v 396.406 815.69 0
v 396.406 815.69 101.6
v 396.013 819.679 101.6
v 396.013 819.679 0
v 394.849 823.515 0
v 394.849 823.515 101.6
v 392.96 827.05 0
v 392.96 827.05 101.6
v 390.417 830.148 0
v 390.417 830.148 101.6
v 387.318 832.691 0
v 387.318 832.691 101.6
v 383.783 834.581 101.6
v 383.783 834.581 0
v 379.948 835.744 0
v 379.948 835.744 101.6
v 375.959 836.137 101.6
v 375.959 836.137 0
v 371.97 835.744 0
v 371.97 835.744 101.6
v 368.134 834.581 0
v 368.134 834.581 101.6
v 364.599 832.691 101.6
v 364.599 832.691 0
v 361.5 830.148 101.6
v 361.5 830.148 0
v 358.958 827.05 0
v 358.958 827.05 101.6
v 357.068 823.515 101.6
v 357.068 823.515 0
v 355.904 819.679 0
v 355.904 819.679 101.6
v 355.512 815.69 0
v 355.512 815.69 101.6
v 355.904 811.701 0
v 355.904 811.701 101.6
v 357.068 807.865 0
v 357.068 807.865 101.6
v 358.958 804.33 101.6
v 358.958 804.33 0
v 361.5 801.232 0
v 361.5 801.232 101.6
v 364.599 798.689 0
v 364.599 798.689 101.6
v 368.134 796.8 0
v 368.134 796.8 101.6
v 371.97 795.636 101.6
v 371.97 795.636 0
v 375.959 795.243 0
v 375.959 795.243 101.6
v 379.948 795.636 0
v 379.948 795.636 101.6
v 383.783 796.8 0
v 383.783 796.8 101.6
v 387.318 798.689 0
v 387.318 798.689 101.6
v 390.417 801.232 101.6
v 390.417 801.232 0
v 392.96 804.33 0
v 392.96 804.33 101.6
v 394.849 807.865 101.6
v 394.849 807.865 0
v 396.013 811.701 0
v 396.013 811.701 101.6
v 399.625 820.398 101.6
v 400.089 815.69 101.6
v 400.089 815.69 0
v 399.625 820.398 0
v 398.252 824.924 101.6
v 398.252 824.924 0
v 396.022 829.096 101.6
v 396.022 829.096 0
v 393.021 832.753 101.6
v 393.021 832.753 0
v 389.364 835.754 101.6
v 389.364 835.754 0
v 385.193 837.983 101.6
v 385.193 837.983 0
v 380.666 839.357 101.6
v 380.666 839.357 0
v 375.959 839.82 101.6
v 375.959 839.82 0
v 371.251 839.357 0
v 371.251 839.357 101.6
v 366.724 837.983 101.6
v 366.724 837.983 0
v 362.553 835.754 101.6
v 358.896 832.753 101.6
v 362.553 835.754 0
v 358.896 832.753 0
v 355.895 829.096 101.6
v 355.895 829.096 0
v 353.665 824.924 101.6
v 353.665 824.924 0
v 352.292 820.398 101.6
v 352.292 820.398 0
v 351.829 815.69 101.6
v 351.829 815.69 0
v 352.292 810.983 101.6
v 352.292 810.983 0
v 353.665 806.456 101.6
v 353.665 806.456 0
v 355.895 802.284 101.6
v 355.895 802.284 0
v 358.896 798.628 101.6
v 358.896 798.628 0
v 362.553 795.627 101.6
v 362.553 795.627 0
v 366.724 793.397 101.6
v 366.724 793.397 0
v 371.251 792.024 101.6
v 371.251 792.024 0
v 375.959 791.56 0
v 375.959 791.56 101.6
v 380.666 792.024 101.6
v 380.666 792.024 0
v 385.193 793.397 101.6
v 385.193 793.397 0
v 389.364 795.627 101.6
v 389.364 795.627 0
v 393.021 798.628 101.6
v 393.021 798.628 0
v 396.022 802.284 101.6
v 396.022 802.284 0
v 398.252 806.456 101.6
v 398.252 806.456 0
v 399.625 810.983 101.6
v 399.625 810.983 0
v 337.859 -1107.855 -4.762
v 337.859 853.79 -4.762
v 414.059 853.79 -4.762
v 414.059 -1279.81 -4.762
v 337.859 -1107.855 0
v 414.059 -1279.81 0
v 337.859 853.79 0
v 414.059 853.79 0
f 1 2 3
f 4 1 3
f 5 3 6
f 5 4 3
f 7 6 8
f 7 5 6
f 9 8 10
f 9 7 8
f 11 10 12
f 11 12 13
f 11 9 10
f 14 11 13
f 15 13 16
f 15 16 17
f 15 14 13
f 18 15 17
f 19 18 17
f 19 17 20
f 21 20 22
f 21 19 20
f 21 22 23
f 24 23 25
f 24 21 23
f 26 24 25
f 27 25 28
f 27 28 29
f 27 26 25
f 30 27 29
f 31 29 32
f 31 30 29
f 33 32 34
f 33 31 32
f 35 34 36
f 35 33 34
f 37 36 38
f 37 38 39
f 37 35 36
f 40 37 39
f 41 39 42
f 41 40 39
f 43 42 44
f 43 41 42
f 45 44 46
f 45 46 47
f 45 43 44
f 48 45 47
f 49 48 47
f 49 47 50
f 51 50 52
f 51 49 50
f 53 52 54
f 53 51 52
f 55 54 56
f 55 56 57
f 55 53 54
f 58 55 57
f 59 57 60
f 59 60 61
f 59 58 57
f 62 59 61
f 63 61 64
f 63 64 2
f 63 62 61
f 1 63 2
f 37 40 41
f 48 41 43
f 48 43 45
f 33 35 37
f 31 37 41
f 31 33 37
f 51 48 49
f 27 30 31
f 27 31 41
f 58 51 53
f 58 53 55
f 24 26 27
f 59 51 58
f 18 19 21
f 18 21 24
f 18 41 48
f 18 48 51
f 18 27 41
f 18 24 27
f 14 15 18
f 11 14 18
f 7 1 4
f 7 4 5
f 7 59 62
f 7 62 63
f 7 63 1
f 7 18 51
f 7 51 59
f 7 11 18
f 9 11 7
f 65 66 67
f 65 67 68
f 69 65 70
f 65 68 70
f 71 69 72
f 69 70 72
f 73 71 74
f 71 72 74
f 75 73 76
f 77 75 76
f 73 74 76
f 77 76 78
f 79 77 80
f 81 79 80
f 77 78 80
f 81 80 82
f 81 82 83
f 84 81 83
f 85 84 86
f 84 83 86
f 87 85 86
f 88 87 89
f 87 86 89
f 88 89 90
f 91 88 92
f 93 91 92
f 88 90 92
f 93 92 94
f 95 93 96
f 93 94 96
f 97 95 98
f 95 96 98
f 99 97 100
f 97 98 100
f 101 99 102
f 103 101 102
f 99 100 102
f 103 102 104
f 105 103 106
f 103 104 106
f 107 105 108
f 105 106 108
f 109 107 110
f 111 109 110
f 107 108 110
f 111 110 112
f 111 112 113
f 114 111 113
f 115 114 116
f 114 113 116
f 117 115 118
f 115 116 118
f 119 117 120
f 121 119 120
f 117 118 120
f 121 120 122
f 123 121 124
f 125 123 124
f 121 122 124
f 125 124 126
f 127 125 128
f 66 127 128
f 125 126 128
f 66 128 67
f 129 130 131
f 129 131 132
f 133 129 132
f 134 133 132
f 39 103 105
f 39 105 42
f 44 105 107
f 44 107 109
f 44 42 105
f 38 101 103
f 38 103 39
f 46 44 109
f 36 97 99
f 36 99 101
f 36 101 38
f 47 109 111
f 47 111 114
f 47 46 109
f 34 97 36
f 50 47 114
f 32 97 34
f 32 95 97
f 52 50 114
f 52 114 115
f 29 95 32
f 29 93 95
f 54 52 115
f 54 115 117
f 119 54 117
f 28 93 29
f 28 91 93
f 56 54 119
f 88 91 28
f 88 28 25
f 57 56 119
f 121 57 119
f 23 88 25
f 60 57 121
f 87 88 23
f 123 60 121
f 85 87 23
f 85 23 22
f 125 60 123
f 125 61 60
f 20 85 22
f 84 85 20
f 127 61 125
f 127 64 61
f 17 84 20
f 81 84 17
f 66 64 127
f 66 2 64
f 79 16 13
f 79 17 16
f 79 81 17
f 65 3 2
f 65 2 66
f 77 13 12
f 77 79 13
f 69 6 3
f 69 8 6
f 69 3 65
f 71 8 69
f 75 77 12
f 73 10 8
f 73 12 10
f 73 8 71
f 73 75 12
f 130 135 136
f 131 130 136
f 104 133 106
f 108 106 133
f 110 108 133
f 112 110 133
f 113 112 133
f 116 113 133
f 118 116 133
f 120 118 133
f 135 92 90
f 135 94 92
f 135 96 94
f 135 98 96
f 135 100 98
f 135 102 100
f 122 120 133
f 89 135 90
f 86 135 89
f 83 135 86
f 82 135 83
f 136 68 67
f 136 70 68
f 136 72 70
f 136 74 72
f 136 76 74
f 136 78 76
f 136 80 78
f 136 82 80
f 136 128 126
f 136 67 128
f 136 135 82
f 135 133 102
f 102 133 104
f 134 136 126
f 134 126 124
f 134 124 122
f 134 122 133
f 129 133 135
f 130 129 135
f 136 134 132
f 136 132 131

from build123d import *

# Parameters (mm, degrees)
F0_W     = 76.2
F0_H     = 2133.6
F1_DEPTH = 4.7625
F2_R     = 24.13
F2_R_2   = 20.447
F3_DEPTH = 101.6
F5_DEPTH = 35.814


with BuildPart() as f1:
    # F0 (on Top) → F1 (new body)
    with BuildSketch(Plane.XY):
        with Locations((375.958569, -213.009804)):
            Rectangle(F0_W, F0_H)
    extrude(amount=-F1_DEPTH)

    # F2 (on face) → F3 (join)
    with BuildSketch(Plane.XY):
        with Locations((375.958569, 815.690196)):
            Circle(F2_R)
        with Locations((375.958569, 815.690196)):
            Circle(F2_R_2, mode=Mode.SUBTRACT)
    extrude(amount=F3_DEPTH)

    # F4 (on face) → F5 (cut)
    with BuildSketch(Plane(origin=(0, 0, -4.7625), x_dir=(1, 0, 0), z_dir=(0, 0, -1))):
        Polygon((337.858569, 1107.854731), (414.058569, 1279.809804), (337.858569, 1279.809804), align=None)
    extrude(amount=-F5_DEPTH, mode=Mode.SUBTRACT)


solid = f1.part
